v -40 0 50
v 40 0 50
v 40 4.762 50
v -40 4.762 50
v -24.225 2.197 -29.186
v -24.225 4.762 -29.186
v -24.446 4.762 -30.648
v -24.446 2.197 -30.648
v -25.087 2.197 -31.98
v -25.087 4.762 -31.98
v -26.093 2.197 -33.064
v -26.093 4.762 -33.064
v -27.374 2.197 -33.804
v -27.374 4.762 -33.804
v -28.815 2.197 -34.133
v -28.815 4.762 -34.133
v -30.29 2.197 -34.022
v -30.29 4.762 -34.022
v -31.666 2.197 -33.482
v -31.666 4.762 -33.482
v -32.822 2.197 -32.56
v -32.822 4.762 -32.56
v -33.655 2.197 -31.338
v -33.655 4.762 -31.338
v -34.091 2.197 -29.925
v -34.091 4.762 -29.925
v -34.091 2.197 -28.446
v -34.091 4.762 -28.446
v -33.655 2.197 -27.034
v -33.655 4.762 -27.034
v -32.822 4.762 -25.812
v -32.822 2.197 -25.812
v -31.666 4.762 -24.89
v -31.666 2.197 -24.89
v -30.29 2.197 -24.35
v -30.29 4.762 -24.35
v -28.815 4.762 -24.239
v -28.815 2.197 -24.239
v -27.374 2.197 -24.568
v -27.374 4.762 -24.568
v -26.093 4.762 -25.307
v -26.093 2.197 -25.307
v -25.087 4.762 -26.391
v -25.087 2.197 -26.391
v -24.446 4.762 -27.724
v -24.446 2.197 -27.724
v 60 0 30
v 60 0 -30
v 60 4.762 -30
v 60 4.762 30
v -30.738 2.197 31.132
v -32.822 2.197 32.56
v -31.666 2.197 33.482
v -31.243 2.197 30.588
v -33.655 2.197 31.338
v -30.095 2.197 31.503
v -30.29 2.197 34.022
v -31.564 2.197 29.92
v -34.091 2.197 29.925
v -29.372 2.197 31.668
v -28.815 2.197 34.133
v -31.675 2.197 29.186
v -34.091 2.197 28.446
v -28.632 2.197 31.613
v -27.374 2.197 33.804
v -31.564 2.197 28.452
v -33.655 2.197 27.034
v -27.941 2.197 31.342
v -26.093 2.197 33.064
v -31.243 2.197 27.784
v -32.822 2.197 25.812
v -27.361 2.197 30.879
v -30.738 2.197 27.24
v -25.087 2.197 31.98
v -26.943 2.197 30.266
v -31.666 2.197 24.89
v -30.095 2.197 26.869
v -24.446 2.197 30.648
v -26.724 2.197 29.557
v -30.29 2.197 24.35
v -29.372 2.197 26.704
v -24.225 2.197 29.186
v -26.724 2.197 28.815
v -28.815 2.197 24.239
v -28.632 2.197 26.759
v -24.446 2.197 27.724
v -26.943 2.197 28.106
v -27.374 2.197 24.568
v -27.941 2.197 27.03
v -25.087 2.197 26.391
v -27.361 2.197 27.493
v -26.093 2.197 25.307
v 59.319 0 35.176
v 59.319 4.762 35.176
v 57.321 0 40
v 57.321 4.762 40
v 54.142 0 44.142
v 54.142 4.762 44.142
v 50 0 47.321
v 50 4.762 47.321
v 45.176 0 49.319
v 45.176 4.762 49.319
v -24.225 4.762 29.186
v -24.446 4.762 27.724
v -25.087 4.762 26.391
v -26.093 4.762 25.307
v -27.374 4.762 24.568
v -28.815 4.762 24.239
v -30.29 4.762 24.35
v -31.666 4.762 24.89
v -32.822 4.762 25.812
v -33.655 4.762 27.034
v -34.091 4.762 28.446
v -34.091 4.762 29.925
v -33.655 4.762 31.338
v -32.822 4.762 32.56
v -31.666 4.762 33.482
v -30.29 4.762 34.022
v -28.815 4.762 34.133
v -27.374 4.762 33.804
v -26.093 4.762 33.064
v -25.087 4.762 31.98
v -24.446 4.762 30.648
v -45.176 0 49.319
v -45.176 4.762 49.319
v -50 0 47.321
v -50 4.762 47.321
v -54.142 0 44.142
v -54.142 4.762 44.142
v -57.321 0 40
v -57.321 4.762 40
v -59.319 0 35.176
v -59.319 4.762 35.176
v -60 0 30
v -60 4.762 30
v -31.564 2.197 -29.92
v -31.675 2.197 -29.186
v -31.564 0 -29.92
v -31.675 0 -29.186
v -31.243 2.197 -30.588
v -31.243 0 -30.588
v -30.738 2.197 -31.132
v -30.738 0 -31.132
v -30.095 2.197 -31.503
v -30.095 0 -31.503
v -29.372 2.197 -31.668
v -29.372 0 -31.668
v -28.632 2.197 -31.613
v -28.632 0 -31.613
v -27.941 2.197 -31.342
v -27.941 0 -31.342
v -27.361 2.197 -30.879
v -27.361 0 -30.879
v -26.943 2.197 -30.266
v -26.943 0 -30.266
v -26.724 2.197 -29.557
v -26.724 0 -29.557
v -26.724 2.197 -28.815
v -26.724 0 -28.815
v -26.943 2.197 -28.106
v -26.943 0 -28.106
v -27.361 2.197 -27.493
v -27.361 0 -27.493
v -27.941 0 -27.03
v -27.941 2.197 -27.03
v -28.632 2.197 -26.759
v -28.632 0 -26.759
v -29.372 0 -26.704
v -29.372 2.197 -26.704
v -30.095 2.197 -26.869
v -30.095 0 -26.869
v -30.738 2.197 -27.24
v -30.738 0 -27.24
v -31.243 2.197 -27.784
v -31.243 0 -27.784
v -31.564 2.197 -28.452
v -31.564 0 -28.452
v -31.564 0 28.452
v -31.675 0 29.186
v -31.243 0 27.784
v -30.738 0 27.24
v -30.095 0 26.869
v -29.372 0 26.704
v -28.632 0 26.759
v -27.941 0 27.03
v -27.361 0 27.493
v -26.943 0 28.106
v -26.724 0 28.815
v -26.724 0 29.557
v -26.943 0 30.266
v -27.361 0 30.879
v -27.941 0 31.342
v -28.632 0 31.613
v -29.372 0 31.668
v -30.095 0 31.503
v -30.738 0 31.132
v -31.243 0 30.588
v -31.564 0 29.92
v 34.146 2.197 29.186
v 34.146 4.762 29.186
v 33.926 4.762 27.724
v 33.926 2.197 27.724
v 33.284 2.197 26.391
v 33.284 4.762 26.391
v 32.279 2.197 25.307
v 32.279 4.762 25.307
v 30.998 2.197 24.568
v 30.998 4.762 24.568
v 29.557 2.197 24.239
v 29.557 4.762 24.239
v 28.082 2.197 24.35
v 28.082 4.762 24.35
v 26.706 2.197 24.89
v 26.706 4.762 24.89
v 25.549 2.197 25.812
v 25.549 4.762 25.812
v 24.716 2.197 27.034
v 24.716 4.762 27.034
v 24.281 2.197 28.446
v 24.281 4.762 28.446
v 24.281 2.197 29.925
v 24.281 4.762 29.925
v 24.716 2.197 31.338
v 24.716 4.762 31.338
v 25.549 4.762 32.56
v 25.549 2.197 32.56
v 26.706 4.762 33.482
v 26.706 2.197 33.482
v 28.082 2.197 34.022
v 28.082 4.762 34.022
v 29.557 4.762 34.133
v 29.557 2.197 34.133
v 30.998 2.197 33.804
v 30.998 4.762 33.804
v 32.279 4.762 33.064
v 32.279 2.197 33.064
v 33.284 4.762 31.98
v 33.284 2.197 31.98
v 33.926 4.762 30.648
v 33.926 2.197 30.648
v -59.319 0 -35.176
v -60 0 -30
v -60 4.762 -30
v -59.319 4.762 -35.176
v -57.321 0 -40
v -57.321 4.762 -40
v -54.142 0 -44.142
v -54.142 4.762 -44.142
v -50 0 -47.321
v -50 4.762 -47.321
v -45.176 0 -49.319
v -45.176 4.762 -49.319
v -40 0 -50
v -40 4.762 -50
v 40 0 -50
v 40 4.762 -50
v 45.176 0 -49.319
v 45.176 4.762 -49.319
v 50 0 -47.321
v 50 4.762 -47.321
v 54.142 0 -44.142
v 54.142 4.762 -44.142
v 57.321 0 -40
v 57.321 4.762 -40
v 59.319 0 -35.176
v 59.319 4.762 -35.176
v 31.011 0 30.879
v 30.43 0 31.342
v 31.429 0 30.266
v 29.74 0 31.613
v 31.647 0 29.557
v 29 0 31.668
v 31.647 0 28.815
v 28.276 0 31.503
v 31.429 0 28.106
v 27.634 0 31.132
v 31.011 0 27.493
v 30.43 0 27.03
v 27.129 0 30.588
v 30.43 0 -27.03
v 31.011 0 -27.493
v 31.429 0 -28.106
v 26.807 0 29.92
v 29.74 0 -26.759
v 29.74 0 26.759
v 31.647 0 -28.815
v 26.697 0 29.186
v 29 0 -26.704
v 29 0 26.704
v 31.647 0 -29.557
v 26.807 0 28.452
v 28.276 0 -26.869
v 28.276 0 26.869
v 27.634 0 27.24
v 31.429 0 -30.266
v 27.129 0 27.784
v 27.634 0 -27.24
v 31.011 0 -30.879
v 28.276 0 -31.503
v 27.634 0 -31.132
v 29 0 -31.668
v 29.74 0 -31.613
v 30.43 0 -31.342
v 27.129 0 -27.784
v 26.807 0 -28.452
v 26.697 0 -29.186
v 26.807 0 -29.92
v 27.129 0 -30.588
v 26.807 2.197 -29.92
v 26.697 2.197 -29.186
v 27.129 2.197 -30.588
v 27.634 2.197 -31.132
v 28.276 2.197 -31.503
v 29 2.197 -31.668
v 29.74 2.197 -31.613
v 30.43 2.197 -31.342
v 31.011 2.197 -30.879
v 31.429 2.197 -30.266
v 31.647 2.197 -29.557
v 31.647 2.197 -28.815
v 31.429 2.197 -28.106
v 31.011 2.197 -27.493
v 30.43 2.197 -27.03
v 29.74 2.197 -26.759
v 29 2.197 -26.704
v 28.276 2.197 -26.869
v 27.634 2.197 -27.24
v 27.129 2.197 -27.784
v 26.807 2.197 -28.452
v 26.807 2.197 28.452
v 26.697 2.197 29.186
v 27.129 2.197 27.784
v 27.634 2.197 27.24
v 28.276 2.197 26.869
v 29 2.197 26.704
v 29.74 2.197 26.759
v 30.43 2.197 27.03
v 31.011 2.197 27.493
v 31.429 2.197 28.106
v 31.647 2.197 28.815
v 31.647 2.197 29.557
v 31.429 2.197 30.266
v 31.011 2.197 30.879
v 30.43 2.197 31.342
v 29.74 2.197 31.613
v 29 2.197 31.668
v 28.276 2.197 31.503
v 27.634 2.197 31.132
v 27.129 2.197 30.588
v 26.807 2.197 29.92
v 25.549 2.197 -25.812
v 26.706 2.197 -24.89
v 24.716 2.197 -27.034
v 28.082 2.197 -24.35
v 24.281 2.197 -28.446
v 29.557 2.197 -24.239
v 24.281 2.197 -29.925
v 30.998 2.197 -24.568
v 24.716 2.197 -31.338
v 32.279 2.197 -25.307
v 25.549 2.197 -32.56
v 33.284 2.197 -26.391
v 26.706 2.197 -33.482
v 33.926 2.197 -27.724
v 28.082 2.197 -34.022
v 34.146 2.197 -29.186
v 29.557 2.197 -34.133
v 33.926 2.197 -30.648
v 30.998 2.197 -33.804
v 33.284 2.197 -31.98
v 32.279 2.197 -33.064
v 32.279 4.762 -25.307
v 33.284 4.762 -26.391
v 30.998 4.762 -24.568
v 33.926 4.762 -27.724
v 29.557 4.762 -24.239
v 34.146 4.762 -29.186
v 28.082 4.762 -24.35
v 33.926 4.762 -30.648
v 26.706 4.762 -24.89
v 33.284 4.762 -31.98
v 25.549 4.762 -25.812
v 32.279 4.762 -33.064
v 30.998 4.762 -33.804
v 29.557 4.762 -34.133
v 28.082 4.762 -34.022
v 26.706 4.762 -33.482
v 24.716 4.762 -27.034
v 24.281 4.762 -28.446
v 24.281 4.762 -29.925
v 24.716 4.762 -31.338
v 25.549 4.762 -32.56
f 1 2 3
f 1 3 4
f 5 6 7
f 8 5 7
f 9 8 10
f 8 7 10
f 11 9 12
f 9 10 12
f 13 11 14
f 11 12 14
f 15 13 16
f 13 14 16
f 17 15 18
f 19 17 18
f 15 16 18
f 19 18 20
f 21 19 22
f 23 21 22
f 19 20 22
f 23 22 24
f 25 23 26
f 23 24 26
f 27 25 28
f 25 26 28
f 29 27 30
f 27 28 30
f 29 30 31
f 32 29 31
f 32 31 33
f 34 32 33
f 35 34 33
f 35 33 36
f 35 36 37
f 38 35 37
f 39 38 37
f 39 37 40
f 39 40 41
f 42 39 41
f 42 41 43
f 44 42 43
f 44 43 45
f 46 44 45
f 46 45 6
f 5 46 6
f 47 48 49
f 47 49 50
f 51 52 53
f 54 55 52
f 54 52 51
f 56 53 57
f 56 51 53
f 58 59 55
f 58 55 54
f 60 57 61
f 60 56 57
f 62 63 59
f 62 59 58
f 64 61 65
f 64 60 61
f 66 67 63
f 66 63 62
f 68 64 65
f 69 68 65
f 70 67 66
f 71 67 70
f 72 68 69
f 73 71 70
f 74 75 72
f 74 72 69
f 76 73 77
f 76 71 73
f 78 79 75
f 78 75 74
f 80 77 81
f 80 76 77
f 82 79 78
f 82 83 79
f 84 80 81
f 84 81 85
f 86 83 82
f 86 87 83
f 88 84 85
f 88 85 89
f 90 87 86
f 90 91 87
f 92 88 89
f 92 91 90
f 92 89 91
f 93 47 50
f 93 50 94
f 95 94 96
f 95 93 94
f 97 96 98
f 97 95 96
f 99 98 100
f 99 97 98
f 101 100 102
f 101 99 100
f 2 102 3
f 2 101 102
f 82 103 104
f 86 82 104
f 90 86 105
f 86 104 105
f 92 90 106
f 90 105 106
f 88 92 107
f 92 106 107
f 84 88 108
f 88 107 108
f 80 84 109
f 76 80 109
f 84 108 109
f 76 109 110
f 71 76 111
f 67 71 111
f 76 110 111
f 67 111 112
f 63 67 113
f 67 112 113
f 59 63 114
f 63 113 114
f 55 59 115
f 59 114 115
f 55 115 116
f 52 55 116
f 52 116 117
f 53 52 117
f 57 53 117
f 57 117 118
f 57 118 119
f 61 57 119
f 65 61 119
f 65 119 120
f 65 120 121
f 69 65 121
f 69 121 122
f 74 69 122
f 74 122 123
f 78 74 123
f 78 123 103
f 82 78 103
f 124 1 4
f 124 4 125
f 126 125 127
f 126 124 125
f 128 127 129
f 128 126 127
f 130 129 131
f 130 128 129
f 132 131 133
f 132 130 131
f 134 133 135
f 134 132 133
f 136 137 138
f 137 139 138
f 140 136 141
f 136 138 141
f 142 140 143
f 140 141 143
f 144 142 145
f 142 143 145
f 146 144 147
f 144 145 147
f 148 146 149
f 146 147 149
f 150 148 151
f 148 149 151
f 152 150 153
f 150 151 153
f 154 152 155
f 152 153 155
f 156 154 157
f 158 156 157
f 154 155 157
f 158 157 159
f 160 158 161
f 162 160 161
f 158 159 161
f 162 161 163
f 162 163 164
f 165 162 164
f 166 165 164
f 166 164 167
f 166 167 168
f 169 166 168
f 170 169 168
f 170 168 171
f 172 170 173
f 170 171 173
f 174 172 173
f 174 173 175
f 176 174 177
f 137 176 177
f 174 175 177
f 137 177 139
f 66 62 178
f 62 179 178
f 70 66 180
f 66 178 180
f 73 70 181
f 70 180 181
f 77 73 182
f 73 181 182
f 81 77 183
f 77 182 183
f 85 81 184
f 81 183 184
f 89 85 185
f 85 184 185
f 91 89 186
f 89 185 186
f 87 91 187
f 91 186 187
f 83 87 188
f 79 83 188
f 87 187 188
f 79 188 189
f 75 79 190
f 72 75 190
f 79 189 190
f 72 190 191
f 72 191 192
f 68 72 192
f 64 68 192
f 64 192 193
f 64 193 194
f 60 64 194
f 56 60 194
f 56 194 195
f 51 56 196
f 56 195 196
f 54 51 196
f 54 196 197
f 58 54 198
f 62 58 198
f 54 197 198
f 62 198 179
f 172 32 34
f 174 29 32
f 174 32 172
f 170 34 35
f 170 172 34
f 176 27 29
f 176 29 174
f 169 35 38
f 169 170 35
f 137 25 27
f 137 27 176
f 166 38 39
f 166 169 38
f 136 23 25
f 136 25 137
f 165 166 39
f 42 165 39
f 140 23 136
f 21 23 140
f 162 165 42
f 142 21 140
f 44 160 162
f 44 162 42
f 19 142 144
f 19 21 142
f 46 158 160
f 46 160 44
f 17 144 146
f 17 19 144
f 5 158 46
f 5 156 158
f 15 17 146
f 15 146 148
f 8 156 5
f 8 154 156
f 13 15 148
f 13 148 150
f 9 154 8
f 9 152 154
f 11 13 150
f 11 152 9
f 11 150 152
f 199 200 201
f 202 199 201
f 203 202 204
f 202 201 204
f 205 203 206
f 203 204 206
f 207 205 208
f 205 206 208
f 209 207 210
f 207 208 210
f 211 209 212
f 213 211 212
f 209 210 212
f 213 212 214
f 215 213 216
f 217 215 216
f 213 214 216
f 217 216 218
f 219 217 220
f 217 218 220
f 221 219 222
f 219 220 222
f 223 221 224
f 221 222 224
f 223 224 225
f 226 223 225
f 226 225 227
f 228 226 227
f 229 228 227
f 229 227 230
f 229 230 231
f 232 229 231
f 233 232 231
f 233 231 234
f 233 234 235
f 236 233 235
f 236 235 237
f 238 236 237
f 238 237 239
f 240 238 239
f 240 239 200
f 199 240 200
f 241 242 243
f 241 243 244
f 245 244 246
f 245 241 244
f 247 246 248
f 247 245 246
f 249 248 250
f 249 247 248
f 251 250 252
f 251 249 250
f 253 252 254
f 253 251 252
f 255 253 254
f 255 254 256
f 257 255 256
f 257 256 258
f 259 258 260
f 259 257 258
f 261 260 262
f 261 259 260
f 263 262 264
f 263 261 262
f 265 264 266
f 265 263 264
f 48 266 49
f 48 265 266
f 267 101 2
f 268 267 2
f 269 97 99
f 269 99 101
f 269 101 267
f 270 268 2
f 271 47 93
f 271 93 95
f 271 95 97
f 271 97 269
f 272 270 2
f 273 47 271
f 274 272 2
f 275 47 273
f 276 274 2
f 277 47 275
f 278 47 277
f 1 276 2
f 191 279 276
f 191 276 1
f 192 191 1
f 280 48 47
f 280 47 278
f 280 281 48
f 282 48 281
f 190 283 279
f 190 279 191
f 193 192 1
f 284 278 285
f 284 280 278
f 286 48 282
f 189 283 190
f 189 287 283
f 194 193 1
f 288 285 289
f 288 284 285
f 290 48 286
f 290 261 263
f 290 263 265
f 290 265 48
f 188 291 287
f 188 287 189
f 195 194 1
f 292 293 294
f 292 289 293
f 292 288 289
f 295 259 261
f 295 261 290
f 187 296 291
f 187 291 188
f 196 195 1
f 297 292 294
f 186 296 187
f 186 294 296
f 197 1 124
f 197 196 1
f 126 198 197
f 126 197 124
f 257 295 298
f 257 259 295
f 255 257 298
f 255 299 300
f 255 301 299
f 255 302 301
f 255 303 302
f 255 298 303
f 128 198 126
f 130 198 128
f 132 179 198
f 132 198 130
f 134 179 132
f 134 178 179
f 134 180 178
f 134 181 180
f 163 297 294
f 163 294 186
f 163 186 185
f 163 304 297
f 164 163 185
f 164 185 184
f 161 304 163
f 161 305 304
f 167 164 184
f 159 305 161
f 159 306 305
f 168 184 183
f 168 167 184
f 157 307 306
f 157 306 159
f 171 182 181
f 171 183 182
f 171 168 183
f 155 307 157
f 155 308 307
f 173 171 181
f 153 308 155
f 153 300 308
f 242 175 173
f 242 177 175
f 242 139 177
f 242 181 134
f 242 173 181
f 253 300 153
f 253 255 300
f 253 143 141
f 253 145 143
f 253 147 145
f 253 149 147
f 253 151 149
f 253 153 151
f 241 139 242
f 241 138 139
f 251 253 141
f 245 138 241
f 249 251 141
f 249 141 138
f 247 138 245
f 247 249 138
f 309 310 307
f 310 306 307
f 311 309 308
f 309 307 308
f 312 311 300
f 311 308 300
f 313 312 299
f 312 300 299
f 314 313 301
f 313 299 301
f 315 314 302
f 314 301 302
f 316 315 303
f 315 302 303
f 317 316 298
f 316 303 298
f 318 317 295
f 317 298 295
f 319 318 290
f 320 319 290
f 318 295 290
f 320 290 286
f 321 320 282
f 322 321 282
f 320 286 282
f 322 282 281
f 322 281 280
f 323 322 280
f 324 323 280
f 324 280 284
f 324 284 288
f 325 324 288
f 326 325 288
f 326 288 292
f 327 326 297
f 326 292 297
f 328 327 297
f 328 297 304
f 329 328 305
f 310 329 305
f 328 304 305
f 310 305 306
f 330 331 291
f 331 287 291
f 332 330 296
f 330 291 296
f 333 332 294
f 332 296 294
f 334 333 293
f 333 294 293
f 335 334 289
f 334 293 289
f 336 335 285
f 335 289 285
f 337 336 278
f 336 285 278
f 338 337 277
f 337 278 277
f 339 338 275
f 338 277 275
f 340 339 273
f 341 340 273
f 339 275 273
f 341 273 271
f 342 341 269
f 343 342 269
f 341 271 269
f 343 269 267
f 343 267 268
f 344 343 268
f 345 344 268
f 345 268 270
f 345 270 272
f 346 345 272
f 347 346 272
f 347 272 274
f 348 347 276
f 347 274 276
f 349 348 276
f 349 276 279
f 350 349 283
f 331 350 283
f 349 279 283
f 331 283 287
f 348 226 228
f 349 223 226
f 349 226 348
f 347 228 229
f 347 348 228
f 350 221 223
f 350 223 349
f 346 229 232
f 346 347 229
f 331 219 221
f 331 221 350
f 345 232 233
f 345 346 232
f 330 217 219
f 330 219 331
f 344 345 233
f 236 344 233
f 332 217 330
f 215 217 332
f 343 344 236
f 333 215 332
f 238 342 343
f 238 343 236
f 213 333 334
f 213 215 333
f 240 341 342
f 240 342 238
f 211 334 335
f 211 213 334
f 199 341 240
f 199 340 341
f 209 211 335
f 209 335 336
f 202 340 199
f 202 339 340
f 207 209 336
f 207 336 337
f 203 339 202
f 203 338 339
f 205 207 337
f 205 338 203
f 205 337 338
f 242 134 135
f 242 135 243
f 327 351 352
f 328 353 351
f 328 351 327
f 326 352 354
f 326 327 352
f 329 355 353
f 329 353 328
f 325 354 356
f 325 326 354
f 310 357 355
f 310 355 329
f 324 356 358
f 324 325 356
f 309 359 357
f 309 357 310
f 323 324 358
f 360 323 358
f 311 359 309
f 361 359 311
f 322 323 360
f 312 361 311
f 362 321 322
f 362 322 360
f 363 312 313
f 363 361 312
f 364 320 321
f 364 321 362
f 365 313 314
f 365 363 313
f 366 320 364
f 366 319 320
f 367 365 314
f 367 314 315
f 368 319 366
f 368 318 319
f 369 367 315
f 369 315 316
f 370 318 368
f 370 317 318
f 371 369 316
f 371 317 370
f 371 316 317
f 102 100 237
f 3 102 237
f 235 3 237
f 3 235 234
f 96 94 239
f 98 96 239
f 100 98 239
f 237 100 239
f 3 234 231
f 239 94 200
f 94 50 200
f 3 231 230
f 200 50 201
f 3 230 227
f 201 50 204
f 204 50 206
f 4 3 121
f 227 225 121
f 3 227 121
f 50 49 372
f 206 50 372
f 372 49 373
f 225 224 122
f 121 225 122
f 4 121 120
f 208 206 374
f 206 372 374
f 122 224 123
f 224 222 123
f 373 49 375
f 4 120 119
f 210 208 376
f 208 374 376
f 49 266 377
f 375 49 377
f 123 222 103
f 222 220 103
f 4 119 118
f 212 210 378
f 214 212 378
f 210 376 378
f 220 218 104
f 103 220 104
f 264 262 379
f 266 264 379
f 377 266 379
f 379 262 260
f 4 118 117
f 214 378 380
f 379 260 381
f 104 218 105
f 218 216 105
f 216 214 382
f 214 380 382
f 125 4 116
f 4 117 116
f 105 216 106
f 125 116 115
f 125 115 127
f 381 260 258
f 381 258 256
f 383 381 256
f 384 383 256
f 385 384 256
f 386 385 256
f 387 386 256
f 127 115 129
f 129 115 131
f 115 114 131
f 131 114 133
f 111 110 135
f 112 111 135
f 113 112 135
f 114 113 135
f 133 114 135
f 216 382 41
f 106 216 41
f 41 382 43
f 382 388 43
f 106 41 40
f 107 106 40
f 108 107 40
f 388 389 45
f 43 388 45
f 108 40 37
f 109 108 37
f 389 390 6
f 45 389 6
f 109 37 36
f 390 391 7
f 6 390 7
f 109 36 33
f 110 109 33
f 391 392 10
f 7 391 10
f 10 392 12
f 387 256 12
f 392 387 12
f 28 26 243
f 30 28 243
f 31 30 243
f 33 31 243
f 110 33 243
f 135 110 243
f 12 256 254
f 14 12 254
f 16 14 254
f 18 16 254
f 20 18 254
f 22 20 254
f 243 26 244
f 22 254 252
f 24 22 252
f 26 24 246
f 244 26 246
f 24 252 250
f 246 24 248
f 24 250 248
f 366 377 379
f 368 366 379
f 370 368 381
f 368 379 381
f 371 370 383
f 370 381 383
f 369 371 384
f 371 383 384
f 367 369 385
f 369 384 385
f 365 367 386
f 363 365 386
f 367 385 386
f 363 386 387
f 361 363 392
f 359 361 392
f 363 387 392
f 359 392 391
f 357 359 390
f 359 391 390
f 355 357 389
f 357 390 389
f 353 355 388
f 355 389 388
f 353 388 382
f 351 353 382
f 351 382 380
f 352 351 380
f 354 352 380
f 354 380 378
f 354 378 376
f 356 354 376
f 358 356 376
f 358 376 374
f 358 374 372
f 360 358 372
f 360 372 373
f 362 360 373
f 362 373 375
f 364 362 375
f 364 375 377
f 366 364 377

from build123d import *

# Parameters (mm, degrees)
BOSS_EXTRUDE1_DEPTH                             = 4.7625
CBORE_FOR_10_BUTTON_HEAD_CAP_SCREW1_D           = 4.9784
CBORE_FOR_10_BUTTON_HEAD_CAP_SCREW1_CBORE_D     = 9.92124
CBORE_FOR_10_BUTTON_HEAD_CAP_SCREW1_CBORE_DEPTH = 2.5654


with BuildPart() as part:
    # Sketch1 → Boss-Extrude1 (new body)
    with BuildSketch(Plane(origin=(0, 0, 0), x_dir=(1, 0, 0), z_dir=(0, 1, 0))):
        with BuildLine():
            Line((40, -50), (-40, -50))
            ThreePointArc((-40, -50), (-54.142135624, -44.142135624), (-60, -30))
            Line((-60, -30), (-60, 30))
            ThreePointArc((-60, 30), (-54.142135624, 44.142135624), (-40, 50))
            Line((-40, 50), (40, 50))
            ThreePointArc((40, 50), (54.142135624, 44.142135624), (60, 30))
            Line((60, 30), (60, -30))
            ThreePointArc((60, -30), (54.142135624, -44.142135624), (40, -50))
        make_face()
    extrude(amount=BOSS_EXTRUDE1_DEPTH)

    # CBORE for #10 Button Head Cap Screw1 (through all)
    with Locations(Plane(origin=(0, 4.7625, 0), x_dir=(1, 0, 0), z_dir=(0, 1, 0))):
        with Locations((29.185832393, 29.185832393), (29.185832393, -29.185832393), (-29.185832393, -29.185832393), (-29.185832393, 29.185832393)):
            CounterBoreHole(CBORE_FOR_10_BUTTON_HEAD_CAP_SCREW1_D / 2, CBORE_FOR_10_BUTTON_HEAD_CAP_SCREW1_CBORE_D / 2, CBORE_FOR_10_BUTTON_HEAD_CAP_SCREW1_CBORE_DEPTH)


solid = part.part
